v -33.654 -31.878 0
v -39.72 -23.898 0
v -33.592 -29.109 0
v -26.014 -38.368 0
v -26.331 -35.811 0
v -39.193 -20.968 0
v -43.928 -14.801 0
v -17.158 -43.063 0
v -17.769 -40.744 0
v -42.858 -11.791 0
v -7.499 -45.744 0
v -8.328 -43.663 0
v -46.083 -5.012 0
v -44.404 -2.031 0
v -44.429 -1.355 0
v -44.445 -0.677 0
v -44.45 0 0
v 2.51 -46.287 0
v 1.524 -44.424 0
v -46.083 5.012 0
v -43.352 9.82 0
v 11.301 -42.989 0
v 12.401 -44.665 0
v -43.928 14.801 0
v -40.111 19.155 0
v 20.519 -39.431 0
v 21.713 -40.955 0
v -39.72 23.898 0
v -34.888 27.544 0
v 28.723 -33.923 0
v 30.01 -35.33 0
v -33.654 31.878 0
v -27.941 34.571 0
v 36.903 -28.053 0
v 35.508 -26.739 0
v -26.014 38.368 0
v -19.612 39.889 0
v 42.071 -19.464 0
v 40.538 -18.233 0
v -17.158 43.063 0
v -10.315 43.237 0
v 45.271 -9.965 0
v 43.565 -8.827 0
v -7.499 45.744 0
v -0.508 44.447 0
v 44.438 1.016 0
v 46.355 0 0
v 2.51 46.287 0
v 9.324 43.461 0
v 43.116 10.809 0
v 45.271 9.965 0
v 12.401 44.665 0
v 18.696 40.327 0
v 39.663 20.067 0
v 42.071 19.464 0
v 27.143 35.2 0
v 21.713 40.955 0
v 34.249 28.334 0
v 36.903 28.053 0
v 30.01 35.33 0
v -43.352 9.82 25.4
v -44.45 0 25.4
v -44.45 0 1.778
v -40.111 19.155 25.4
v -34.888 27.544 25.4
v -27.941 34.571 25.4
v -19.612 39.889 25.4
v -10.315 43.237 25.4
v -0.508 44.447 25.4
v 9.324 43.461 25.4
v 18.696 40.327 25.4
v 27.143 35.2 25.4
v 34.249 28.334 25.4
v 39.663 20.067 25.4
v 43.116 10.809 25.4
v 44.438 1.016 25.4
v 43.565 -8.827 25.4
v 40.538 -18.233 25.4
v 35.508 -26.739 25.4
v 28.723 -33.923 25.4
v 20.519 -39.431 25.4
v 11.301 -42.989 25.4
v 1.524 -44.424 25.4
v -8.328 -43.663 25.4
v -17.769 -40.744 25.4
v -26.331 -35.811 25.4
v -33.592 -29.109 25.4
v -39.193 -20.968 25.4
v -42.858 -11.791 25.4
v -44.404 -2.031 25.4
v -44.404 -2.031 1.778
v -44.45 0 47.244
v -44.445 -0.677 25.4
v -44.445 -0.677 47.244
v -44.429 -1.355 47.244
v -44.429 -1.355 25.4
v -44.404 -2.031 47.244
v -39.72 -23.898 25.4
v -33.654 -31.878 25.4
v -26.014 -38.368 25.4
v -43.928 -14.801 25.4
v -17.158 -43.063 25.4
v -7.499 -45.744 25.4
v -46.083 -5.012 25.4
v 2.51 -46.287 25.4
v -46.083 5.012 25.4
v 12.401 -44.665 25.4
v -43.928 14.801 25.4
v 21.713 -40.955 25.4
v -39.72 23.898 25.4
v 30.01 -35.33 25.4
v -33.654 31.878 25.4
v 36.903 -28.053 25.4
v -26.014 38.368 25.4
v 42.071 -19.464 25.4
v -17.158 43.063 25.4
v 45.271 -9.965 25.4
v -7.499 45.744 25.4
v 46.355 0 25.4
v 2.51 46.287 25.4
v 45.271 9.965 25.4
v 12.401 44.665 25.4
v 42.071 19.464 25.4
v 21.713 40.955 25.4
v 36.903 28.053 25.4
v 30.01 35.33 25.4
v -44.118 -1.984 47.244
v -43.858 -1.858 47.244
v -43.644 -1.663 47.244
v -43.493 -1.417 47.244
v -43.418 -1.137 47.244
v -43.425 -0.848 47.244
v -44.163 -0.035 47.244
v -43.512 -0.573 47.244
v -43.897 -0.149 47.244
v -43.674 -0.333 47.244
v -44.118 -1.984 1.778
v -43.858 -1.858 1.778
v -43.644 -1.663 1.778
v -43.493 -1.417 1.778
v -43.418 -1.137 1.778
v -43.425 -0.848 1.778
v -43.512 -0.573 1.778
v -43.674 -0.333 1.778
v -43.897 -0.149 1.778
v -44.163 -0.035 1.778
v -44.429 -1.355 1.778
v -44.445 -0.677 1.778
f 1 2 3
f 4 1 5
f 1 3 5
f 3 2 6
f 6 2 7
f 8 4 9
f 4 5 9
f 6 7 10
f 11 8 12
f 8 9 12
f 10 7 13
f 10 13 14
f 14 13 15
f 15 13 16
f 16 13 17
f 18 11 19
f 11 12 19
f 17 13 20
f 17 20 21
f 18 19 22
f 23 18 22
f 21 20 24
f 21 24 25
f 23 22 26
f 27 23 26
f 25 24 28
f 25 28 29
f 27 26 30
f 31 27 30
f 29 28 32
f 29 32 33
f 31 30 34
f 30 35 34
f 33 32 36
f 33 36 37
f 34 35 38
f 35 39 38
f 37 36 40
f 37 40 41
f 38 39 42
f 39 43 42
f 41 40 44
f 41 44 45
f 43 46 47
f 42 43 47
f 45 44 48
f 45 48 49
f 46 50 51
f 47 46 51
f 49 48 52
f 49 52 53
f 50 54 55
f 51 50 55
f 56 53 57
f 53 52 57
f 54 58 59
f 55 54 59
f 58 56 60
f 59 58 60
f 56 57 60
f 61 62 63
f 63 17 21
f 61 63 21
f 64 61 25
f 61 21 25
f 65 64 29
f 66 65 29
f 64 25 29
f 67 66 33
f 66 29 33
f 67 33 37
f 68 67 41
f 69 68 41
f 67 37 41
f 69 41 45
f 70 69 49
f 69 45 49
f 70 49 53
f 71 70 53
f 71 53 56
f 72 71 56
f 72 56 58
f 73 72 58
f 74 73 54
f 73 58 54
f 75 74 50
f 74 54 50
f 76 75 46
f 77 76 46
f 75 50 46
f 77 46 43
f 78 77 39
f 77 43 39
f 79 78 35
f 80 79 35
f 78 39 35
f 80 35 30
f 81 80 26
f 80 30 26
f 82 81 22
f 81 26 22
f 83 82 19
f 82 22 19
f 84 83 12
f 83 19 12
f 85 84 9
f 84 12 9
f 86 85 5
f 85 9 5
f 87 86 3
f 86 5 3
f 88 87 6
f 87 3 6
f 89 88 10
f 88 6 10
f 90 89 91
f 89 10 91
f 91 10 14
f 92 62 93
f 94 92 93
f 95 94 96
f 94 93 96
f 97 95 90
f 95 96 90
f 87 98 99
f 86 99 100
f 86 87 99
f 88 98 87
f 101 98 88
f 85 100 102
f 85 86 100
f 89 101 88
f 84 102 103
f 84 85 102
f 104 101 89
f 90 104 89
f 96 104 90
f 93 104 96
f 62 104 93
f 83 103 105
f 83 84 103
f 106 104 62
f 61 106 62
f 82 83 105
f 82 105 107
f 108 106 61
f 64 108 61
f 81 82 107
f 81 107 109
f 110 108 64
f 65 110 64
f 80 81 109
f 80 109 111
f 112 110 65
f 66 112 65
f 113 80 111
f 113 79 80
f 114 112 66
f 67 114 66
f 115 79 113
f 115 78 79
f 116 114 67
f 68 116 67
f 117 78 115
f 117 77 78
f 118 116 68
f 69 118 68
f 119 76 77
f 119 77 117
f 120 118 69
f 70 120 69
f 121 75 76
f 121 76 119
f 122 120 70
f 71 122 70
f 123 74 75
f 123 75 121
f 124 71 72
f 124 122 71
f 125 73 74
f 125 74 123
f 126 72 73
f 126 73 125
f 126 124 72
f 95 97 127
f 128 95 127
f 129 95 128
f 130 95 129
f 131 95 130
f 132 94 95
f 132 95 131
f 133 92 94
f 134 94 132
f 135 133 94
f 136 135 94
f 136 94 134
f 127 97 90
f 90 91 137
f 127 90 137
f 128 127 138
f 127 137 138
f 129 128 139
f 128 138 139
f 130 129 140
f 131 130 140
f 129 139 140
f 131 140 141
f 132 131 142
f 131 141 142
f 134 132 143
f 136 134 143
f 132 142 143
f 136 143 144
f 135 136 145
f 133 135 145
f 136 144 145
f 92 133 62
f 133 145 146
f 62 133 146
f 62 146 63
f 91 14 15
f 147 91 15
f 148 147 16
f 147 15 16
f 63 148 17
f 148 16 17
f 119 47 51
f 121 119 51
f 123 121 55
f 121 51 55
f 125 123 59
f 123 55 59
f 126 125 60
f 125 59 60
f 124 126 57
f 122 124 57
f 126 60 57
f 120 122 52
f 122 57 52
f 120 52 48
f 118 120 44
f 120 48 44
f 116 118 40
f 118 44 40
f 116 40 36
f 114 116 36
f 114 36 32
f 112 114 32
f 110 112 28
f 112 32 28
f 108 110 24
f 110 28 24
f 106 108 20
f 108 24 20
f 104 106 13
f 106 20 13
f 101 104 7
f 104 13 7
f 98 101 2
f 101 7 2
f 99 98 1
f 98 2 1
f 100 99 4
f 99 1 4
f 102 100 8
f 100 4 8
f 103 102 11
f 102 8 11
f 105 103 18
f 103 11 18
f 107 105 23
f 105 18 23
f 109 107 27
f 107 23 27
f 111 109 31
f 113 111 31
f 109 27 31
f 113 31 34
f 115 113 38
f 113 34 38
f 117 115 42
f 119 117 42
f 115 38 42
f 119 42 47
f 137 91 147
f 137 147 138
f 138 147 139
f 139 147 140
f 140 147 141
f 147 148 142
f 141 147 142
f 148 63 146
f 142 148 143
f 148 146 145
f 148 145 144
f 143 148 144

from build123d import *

# Parameters (mm, degrees)
F0_R          = 46.355
F1_DEPTH      = 25.4
F2_START      = 1.778
F2_DEPTH      = 21.844
F3_DEPTH      = 23.622
F3_DEPTH_BACK = 1.778


with BuildPart() as f1:
    # F0 (on Top) → F1 (new body)
    with BuildSketch(Plane.XY):
        Circle(F0_R)
        with BuildLine():
            ThreePointArc((-44.45, 0), (0, 44.45), (44.45, 0))
            ThreePointArc((44.45, 0), (1.016, -44.4383870544), (-44.4035542857, -2.0314691225))
            ThreePointArc((-44.4035542857, -2.0314691225), (-44.4383870544, -1.016), (-44.45, 0))
        make_face(mode=Mode.SUBTRACT)
    extrude(amount=F1_DEPTH)

    # F0 (on Top) → F2 (join)
    with BuildSketch(Plane.XY.offset(F2_START)):
        with BuildLine():
            ThreePointArc((-44.4035542857, -2.0314691225), (-43.4110425816, -0.9925117041), (-44.45, 0))
            ThreePointArc((-44.45, 0), (-44.4383870544, -1.016), (-44.4035542857, -2.0314691225))
        make_face()
    extrude(amount=F2_DEPTH)

    # F3 (add, two sides): a face of the model
    f3_faces = [f1.faces().sort_by_distance(p)[0] for p in [
        (-43.9998730556, -1.0059742036, 23.622),
    ]]
    extrude(f3_faces, amount=F3_DEPTH)
    extrude(f3_faces, amount=-F3_DEPTH_BACK)


solid = f1.part
